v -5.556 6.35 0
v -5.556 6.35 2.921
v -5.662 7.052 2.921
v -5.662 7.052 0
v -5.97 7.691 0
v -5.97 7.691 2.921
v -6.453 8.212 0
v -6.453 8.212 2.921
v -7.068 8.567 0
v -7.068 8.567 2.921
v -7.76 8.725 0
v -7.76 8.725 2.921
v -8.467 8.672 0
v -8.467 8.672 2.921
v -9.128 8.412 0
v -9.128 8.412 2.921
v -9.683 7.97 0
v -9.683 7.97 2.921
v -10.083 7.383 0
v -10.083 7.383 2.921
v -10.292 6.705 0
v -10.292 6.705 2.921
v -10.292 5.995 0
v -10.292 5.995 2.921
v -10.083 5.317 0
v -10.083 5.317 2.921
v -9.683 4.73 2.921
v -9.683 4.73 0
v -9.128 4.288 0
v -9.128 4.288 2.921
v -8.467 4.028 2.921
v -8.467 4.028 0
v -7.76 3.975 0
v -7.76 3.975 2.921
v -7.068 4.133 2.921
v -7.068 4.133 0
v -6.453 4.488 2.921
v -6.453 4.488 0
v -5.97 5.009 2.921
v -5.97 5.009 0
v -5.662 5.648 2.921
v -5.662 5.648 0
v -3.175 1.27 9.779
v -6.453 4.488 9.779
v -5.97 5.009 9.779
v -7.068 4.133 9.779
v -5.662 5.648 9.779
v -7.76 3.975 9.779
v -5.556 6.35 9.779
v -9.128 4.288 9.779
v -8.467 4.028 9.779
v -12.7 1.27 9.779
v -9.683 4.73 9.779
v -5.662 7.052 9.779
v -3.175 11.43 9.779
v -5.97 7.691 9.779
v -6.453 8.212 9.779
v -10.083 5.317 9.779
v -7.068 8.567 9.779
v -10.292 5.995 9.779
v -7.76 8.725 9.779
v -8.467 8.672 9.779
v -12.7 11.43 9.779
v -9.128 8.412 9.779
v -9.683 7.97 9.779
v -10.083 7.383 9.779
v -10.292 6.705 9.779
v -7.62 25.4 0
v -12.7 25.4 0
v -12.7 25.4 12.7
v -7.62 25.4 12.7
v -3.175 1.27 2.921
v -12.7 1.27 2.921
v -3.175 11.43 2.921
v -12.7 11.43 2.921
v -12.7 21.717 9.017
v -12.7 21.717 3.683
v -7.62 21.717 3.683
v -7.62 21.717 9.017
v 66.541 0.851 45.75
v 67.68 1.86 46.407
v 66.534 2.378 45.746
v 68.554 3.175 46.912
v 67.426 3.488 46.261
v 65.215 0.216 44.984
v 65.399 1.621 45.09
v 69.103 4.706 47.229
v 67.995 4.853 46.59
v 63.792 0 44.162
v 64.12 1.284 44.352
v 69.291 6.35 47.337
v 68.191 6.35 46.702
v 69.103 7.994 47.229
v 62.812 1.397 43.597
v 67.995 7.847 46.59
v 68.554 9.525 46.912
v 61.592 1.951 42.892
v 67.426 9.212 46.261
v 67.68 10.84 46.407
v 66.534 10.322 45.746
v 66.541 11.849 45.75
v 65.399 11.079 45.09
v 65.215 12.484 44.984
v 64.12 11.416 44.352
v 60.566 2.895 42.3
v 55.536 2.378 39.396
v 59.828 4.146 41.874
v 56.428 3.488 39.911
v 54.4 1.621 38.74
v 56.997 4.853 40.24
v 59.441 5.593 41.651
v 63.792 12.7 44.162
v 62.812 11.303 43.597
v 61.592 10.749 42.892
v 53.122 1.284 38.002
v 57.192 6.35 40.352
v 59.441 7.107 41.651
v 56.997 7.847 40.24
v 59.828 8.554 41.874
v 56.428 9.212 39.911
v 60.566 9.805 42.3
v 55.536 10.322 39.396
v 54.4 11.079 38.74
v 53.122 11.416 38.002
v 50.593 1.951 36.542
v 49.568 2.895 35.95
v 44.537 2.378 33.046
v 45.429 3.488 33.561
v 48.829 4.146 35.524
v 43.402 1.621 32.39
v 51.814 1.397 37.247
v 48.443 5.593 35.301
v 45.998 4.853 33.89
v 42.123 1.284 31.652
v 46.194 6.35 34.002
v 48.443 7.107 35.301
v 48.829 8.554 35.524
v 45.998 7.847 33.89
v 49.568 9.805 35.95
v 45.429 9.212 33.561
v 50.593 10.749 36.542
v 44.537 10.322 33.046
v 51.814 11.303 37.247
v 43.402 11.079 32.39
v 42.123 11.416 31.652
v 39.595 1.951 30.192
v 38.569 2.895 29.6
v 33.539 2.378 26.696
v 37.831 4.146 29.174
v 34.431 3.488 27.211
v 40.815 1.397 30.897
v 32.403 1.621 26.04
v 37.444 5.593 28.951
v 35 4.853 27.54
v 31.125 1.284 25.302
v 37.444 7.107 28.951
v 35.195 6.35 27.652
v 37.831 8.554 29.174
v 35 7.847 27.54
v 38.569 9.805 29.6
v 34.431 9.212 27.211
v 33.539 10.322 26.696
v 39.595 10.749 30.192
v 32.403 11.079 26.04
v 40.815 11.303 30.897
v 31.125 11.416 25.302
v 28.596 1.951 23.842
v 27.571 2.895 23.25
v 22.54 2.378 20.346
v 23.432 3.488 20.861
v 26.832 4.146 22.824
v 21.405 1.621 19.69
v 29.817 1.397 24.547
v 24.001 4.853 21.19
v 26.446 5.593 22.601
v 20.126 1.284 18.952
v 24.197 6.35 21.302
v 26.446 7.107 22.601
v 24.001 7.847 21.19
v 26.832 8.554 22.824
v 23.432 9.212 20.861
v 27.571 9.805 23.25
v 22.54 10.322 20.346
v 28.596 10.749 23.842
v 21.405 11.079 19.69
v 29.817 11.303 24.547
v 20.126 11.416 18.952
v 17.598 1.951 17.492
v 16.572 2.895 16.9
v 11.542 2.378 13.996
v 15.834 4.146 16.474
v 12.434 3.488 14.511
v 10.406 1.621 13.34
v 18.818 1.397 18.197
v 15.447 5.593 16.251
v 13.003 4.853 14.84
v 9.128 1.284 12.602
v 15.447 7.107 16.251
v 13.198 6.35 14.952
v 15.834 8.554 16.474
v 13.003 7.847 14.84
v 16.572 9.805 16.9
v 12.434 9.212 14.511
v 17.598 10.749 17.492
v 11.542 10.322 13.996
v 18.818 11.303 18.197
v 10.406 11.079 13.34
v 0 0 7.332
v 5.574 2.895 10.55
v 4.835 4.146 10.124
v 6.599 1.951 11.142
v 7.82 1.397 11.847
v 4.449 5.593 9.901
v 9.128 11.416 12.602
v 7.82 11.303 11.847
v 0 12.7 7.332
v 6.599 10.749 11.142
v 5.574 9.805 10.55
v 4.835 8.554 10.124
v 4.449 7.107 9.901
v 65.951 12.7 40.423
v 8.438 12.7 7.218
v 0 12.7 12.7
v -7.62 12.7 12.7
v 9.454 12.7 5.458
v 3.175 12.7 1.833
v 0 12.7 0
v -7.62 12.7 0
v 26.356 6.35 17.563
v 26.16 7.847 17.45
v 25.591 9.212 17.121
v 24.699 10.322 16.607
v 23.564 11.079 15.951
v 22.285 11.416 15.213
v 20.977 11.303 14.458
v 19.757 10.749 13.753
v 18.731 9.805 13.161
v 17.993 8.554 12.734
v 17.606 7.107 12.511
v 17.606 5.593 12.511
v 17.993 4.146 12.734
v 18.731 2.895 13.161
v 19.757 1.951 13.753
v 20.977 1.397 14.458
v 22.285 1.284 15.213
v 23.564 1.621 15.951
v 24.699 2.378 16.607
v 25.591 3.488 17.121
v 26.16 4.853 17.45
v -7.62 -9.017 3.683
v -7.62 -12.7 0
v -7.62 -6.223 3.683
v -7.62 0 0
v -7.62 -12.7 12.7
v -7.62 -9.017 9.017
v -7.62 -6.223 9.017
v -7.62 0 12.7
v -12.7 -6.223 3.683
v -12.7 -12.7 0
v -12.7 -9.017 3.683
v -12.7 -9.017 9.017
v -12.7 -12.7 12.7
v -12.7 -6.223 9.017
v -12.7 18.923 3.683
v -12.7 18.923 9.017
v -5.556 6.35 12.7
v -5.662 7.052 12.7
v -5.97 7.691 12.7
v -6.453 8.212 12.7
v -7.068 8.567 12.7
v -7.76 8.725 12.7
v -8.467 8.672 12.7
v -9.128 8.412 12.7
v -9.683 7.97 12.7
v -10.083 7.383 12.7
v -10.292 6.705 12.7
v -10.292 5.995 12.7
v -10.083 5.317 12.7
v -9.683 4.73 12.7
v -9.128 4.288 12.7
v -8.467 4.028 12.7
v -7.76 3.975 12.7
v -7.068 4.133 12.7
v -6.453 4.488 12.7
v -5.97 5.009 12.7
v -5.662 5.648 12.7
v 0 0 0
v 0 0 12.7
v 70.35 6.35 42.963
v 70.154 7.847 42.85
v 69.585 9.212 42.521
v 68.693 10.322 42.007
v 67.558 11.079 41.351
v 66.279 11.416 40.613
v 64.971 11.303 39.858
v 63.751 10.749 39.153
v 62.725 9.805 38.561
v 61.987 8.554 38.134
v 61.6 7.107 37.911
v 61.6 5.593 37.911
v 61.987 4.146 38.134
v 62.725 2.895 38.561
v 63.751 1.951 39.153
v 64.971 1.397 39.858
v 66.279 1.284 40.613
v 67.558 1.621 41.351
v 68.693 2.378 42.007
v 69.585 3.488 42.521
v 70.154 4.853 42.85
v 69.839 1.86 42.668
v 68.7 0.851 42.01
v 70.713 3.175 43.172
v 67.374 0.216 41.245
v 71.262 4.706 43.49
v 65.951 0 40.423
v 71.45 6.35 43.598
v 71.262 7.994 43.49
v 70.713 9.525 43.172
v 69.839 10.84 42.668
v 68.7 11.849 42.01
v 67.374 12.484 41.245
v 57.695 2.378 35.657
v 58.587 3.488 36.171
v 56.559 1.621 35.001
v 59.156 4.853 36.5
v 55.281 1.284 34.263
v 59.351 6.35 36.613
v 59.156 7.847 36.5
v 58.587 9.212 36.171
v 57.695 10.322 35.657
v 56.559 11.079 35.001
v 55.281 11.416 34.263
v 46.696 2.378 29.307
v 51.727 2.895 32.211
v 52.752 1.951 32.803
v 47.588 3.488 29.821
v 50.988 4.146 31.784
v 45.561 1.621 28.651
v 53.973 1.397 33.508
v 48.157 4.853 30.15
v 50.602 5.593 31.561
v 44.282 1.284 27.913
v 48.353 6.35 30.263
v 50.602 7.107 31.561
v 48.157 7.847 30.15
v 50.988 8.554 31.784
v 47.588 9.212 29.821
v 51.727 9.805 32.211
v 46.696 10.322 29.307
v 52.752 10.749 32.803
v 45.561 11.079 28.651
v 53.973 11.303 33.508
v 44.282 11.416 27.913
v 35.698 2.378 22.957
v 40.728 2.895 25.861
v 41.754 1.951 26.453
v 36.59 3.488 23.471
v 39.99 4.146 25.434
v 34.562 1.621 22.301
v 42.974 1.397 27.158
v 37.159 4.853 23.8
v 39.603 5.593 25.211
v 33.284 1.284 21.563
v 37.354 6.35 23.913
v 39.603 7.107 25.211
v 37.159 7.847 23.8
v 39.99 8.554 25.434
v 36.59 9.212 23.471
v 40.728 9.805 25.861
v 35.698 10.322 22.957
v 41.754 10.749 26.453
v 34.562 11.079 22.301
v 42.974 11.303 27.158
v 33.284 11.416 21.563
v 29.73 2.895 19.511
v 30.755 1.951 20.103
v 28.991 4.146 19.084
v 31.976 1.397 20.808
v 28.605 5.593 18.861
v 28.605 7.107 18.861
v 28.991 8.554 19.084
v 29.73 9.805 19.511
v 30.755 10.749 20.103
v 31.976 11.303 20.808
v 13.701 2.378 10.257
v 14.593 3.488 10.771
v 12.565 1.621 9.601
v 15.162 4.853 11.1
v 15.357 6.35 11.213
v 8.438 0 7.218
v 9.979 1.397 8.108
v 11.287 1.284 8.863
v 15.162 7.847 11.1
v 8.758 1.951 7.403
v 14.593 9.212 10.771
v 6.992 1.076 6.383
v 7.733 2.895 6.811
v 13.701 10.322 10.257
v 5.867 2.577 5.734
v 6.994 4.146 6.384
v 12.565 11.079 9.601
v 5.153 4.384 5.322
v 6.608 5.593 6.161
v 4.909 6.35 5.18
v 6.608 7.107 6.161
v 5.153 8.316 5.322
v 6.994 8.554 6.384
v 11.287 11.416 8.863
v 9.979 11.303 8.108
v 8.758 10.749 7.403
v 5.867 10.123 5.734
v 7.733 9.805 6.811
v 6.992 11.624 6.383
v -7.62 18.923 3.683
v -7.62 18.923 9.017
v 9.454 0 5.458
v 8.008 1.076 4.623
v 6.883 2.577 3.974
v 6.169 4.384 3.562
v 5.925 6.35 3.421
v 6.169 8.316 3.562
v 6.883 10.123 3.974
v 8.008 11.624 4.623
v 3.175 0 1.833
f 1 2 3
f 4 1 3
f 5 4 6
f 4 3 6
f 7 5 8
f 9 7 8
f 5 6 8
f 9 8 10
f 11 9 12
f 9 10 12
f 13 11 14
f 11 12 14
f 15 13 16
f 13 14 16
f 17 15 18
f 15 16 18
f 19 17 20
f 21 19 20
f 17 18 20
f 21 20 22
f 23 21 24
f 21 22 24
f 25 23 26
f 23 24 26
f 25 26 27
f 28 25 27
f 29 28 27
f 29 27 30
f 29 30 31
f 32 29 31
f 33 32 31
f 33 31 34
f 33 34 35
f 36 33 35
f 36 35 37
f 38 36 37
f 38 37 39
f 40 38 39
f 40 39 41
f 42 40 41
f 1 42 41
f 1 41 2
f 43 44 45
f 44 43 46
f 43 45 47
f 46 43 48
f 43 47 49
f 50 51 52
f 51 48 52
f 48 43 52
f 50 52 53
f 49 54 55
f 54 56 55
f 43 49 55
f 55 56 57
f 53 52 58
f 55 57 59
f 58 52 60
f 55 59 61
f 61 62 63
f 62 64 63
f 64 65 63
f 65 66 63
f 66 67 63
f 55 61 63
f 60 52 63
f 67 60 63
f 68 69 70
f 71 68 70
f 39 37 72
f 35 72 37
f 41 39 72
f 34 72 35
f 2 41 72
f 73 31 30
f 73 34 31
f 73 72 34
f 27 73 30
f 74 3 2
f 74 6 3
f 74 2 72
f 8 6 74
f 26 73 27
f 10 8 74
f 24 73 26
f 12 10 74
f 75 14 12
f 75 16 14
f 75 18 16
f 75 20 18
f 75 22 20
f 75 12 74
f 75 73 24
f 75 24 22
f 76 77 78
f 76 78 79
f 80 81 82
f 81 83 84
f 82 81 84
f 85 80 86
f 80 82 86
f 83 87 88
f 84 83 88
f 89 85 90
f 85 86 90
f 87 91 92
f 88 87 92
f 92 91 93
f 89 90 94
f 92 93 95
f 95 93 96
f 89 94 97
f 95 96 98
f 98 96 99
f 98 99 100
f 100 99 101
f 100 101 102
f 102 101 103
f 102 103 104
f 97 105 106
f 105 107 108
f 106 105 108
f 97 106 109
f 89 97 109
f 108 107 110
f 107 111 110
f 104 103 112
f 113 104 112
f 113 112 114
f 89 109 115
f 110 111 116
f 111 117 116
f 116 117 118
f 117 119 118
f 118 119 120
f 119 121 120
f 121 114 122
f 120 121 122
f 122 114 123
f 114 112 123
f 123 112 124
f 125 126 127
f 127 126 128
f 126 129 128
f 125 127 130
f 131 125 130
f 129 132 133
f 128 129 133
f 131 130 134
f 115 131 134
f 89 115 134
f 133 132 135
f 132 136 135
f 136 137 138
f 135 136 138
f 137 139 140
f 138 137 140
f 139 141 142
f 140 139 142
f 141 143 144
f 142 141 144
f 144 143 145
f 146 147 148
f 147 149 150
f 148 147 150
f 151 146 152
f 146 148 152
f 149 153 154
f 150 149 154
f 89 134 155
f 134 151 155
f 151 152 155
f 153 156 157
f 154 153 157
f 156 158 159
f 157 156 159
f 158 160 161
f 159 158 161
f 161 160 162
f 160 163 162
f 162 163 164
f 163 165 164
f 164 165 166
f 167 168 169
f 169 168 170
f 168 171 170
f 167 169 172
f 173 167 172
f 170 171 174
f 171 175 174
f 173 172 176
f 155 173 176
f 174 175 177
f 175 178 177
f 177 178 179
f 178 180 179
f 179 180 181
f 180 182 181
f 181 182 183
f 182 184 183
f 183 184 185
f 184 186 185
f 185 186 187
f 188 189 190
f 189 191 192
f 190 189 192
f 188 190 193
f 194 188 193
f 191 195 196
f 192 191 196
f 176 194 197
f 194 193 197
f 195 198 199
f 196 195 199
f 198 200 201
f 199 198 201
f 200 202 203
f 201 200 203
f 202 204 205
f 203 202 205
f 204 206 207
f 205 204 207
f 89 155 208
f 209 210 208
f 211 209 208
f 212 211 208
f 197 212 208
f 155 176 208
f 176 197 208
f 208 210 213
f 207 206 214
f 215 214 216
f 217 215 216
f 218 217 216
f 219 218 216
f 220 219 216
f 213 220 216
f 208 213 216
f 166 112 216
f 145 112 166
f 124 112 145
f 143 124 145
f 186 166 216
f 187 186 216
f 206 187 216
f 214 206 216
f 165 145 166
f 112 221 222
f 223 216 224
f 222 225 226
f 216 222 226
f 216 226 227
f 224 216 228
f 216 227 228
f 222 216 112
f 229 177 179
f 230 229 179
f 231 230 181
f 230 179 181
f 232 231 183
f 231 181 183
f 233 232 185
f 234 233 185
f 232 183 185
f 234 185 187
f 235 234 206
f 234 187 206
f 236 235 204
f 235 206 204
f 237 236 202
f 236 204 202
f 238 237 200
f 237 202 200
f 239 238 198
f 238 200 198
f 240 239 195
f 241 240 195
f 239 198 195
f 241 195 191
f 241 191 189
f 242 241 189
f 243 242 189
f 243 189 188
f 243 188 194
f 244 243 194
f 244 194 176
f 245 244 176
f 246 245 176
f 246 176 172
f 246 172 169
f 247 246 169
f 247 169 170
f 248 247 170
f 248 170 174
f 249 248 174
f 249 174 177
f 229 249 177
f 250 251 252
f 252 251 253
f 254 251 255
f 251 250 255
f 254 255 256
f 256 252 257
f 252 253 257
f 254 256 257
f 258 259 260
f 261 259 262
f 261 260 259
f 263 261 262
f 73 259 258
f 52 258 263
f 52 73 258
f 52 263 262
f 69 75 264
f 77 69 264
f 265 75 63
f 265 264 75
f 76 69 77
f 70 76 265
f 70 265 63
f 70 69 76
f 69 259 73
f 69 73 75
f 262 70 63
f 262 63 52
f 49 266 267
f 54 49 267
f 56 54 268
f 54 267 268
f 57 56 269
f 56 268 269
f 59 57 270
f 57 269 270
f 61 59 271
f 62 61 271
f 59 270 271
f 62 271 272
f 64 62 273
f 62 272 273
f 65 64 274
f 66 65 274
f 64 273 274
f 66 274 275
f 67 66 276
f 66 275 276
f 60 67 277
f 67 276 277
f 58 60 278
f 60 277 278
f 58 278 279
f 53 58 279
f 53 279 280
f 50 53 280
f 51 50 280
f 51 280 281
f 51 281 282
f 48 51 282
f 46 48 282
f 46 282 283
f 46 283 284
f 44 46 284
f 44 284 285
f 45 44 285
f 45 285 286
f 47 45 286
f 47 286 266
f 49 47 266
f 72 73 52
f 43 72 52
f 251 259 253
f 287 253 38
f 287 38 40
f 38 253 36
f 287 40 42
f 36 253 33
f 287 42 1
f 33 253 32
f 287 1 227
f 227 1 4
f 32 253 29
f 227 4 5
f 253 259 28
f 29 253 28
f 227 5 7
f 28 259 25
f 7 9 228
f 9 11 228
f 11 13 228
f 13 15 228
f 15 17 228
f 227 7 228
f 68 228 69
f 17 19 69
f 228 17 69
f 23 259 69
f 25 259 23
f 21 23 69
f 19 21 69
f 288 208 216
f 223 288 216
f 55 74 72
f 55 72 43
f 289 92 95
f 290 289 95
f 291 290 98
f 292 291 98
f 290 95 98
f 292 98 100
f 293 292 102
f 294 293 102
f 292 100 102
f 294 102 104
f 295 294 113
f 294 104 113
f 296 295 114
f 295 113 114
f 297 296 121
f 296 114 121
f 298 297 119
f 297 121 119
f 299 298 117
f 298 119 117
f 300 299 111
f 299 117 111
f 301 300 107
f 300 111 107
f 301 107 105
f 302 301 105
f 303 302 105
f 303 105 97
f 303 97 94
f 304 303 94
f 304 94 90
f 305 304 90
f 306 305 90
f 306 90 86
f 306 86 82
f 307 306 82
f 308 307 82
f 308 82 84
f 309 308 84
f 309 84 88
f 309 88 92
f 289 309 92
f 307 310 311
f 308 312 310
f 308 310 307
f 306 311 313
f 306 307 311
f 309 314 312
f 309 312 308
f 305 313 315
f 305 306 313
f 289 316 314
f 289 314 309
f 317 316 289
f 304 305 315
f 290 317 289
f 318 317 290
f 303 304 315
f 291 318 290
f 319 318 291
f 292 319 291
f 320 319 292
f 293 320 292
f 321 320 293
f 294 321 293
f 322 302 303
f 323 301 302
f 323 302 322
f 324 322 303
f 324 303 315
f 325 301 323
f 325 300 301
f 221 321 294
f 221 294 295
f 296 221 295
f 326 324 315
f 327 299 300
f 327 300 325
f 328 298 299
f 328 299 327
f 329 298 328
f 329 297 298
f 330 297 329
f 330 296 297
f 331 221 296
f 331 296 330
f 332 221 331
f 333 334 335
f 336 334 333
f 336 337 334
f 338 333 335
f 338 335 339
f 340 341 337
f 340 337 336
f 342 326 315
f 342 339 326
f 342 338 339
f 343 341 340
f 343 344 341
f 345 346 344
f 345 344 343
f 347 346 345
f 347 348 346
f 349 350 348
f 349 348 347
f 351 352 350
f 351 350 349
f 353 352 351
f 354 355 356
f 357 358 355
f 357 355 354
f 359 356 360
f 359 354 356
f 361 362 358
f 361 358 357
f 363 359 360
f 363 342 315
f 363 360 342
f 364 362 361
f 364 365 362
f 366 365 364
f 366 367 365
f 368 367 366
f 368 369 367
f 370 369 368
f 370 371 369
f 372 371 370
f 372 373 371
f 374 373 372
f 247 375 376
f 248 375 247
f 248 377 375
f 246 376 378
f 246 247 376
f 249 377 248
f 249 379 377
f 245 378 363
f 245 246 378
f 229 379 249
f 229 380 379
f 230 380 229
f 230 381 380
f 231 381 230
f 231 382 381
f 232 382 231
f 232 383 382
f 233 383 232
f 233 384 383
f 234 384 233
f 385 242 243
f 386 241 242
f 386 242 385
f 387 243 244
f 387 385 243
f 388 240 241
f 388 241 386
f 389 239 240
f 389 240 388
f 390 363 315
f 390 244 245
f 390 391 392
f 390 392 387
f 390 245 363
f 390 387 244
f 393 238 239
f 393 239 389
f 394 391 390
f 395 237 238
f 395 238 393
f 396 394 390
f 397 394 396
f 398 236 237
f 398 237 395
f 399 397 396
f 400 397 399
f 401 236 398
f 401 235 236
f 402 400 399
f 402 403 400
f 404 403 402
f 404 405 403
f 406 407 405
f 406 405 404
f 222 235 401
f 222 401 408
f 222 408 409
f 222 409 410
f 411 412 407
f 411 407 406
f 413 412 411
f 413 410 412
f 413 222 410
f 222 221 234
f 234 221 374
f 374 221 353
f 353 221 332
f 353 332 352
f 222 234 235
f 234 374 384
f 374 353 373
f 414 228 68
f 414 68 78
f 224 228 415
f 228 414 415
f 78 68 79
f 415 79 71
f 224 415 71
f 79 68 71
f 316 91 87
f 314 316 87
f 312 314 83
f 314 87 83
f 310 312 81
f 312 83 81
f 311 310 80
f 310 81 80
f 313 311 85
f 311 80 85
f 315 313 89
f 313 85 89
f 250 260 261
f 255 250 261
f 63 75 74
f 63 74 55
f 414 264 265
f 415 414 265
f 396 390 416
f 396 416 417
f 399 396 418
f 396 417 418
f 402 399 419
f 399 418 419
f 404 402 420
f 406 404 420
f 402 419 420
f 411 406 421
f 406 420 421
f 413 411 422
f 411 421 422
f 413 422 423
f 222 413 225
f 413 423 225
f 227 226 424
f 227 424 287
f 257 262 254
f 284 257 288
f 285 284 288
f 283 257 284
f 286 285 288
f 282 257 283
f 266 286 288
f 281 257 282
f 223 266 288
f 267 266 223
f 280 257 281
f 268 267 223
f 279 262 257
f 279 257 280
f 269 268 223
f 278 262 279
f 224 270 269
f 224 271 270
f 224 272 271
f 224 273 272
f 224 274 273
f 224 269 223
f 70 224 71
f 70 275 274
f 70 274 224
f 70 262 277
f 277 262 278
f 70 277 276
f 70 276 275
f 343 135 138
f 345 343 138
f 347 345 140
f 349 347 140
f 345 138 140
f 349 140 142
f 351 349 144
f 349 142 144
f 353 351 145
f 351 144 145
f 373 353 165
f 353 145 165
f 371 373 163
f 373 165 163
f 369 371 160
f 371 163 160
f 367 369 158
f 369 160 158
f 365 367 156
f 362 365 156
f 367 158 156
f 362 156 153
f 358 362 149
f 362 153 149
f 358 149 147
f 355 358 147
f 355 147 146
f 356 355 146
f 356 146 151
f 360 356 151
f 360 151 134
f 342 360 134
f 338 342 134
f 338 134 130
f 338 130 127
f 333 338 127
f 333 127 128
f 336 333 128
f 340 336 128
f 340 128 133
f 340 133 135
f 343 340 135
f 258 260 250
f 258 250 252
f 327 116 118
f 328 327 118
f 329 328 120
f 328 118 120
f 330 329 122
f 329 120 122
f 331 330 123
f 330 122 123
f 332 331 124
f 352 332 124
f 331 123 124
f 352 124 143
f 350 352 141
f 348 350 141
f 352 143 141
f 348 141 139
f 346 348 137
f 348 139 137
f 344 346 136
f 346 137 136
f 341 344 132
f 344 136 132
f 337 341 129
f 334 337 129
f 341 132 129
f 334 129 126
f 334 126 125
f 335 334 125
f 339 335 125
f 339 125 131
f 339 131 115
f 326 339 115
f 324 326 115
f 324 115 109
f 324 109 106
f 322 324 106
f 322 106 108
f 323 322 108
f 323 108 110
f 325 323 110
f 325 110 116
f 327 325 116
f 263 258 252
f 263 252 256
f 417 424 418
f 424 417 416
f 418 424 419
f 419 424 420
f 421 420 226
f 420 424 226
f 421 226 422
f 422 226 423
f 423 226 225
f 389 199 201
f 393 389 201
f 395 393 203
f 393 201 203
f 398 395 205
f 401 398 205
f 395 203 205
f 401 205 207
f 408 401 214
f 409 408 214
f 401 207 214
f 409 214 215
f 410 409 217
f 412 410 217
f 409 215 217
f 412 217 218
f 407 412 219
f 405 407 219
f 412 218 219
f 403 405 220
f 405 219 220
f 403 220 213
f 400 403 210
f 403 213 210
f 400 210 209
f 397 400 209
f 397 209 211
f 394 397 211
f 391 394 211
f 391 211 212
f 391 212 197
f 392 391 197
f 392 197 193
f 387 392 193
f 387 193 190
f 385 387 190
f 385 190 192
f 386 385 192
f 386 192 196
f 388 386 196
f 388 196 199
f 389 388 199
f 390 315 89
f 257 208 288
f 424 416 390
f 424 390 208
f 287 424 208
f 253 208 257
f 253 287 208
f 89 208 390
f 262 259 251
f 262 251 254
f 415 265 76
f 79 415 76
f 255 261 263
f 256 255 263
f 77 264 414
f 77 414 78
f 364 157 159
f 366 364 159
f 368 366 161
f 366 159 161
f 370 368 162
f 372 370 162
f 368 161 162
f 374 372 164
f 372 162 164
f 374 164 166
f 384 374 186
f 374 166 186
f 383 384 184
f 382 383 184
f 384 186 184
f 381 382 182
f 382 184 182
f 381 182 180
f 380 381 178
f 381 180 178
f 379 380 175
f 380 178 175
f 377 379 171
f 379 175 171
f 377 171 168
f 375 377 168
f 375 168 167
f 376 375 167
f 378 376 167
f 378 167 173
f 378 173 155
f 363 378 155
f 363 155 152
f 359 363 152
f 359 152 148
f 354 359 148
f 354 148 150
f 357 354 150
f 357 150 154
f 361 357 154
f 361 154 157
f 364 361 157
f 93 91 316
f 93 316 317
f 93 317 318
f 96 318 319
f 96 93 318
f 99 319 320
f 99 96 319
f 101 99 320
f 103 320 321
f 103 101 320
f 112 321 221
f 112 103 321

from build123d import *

# Parameters (mm, degrees)
SKETCH1_W           = 12.7
SKETCH1_H           = 12.7
BOSS_EXTRUDE1_DEPTH = 12.7
SKETCH2_W           = 12.7
SKETCH2_H           = 12.7
SKETCH2_W_2         = 5.334
SKETCH2_H_2         = 2.794
BOSS_EXTRUDE2_DEPTH = 5.08
SKETCH3_W           = 6.858
SKETCH3_H           = 10.16
CUT_EXTRUDE1_DEPTH  = 9.525
SKETCH4_R           = 2.38125
CUT_EXTRUDE2_DEPTH  = 32.108519733
BOSS_EXTRUDE3_DEPTH = 12.7
SKETCH8_R           = 5.08
CUT_EXTRUDE5_DEPTH  = 91.094949376
FILLET2_R           = 6.35
SKETCH9_R           = 6.985
SKETCH9_W           = 80.922597298
SKETCH9_H           = 13.97
CUT_EXTRUDE6_DEPTH  = 2.032


with BuildPart() as part:
    # Sketch1 → Boss-Extrude1 (new body)
    with BuildSketch(Plane.XY):
        with Locations((-6.35, 6.35)):
            Rectangle(SKETCH1_W, SKETCH1_H)
    extrude(amount=BOSS_EXTRUDE1_DEPTH)

    # Sketch2 → Boss-Extrude2 (add)
    # profile 1 of 2: a face of its own
    with BuildSketch(Plane.ZY.offset(12.7)):
        with Locations((6.35, 19.05)):
            Rectangle(SKETCH2_W, SKETCH2_H)
        with Locations((6.35, 20.32)):
            Rectangle(SKETCH2_W_2, SKETCH2_H_2, mode=Mode.SUBTRACT)
    # profile 2 of 2: a face of its own
    with BuildSketch(Plane.ZY.offset(12.7)):
        with Locations((6.35, -6.35)):
            Rectangle(SKETCH2_W, SKETCH2_H)
        with Locations((6.35, -7.62)):
            Rectangle(SKETCH2_W_2, SKETCH2_H_2, mode=Mode.SUBTRACT)
    extrude(amount=-BOSS_EXTRUDE2_DEPTH)

    # Sketch3 → Cut-Extrude1 (cut)
    with BuildSketch(Plane.ZY.offset(12.7)):
        with Locations((6.35, 6.35)):
            Rectangle(SKETCH3_W, SKETCH3_H)
    extrude(amount=-CUT_EXTRUDE1_DEPTH, mode=Mode.SUBTRACT)

    # Sketch4 → Cut-Extrude2 (cut, through all)
    with BuildSketch(Plane.XY.offset(12.7)):
        with Locations((-7.9375, 6.35)):
            Circle(SKETCH4_R)
    extrude(amount=-CUT_EXTRUDE2_DEPTH, mode=Mode.SUBTRACT)

    # Sketch7 → Boss-Extrude3 (add)
    with BuildSketch(Plane(origin=(0, 12.7, 0), x_dir=(1, 0, 0), z_dir=(0, 1, 0))):
        Polygon((72.465692557, -41.838087105), (69.290692557, -47.337348419), (0, -7.332348419), (3.175, -1.833087105), align=None)
        Polygon((0, 0), (0, -7.332348419), (3.175, -1.833087105), align=None)
    extrude(amount=-BOSS_EXTRUDE3_DEPTH)

    # Sketch8 → Cut-Extrude5 (cut, through all)
    with BuildSketch(Plane(origin=(-3.175, 0, 5.499261314), x_dir=(0.8660254037844417, 0, 0.49999999999999495), z_dir=(-0.49999999999999495, 0, 0.8660254037844417))):
        with Locations((13.826174209, 6.35)):
            Circle(SKETCH8_R)
        with Locations((26.526174209, 6.35)):
            Circle(SKETCH8_R)
        with Locations((39.226174209, 6.35)):
            Circle(SKETCH8_R)
        with Locations((51.926174209, 6.35)):
            Circle(SKETCH8_R)
        with Locations((64.626174209, 6.35)):
            Circle(SKETCH8_R)
        with Locations((77.326174209, 6.35)):
            Circle(SKETCH8_R)
    extrude(amount=-CUT_EXTRUDE5_DEPTH, mode=Mode.SUBTRACT)

    # Fillet2
    fillet2_edges = [part.edges().sort_by_distance(p)[0] for p in [
        (70.878192557, 0, 44.587717762),
        (70.878192557, 12.7, 44.587717762),
    ]]
    fillet(fillet2_edges, radius=FILLET2_R - 0.0001)  # a hair under: the kernel refuses the full size

    # Sketch9 → Cut-Extrude6 (cut)
    with BuildSketch(Plane(origin=(0, 0, 0), x_dir=(-0.8660254037844417, 0, -0.4999999999999947), z_dir=(0.4999999999999947, 0, -0.8660254037844417))):
        with Locations((-13.826174209, 6.35)):
            Circle(SKETCH9_R)
        with Locations((-54.287472858, 6.35)):
            Rectangle(SKETCH9_W, SKETCH9_H)
    extrude(amount=-CUT_EXTRUDE6_DEPTH, mode=Mode.SUBTRACT)


solid = part.part
